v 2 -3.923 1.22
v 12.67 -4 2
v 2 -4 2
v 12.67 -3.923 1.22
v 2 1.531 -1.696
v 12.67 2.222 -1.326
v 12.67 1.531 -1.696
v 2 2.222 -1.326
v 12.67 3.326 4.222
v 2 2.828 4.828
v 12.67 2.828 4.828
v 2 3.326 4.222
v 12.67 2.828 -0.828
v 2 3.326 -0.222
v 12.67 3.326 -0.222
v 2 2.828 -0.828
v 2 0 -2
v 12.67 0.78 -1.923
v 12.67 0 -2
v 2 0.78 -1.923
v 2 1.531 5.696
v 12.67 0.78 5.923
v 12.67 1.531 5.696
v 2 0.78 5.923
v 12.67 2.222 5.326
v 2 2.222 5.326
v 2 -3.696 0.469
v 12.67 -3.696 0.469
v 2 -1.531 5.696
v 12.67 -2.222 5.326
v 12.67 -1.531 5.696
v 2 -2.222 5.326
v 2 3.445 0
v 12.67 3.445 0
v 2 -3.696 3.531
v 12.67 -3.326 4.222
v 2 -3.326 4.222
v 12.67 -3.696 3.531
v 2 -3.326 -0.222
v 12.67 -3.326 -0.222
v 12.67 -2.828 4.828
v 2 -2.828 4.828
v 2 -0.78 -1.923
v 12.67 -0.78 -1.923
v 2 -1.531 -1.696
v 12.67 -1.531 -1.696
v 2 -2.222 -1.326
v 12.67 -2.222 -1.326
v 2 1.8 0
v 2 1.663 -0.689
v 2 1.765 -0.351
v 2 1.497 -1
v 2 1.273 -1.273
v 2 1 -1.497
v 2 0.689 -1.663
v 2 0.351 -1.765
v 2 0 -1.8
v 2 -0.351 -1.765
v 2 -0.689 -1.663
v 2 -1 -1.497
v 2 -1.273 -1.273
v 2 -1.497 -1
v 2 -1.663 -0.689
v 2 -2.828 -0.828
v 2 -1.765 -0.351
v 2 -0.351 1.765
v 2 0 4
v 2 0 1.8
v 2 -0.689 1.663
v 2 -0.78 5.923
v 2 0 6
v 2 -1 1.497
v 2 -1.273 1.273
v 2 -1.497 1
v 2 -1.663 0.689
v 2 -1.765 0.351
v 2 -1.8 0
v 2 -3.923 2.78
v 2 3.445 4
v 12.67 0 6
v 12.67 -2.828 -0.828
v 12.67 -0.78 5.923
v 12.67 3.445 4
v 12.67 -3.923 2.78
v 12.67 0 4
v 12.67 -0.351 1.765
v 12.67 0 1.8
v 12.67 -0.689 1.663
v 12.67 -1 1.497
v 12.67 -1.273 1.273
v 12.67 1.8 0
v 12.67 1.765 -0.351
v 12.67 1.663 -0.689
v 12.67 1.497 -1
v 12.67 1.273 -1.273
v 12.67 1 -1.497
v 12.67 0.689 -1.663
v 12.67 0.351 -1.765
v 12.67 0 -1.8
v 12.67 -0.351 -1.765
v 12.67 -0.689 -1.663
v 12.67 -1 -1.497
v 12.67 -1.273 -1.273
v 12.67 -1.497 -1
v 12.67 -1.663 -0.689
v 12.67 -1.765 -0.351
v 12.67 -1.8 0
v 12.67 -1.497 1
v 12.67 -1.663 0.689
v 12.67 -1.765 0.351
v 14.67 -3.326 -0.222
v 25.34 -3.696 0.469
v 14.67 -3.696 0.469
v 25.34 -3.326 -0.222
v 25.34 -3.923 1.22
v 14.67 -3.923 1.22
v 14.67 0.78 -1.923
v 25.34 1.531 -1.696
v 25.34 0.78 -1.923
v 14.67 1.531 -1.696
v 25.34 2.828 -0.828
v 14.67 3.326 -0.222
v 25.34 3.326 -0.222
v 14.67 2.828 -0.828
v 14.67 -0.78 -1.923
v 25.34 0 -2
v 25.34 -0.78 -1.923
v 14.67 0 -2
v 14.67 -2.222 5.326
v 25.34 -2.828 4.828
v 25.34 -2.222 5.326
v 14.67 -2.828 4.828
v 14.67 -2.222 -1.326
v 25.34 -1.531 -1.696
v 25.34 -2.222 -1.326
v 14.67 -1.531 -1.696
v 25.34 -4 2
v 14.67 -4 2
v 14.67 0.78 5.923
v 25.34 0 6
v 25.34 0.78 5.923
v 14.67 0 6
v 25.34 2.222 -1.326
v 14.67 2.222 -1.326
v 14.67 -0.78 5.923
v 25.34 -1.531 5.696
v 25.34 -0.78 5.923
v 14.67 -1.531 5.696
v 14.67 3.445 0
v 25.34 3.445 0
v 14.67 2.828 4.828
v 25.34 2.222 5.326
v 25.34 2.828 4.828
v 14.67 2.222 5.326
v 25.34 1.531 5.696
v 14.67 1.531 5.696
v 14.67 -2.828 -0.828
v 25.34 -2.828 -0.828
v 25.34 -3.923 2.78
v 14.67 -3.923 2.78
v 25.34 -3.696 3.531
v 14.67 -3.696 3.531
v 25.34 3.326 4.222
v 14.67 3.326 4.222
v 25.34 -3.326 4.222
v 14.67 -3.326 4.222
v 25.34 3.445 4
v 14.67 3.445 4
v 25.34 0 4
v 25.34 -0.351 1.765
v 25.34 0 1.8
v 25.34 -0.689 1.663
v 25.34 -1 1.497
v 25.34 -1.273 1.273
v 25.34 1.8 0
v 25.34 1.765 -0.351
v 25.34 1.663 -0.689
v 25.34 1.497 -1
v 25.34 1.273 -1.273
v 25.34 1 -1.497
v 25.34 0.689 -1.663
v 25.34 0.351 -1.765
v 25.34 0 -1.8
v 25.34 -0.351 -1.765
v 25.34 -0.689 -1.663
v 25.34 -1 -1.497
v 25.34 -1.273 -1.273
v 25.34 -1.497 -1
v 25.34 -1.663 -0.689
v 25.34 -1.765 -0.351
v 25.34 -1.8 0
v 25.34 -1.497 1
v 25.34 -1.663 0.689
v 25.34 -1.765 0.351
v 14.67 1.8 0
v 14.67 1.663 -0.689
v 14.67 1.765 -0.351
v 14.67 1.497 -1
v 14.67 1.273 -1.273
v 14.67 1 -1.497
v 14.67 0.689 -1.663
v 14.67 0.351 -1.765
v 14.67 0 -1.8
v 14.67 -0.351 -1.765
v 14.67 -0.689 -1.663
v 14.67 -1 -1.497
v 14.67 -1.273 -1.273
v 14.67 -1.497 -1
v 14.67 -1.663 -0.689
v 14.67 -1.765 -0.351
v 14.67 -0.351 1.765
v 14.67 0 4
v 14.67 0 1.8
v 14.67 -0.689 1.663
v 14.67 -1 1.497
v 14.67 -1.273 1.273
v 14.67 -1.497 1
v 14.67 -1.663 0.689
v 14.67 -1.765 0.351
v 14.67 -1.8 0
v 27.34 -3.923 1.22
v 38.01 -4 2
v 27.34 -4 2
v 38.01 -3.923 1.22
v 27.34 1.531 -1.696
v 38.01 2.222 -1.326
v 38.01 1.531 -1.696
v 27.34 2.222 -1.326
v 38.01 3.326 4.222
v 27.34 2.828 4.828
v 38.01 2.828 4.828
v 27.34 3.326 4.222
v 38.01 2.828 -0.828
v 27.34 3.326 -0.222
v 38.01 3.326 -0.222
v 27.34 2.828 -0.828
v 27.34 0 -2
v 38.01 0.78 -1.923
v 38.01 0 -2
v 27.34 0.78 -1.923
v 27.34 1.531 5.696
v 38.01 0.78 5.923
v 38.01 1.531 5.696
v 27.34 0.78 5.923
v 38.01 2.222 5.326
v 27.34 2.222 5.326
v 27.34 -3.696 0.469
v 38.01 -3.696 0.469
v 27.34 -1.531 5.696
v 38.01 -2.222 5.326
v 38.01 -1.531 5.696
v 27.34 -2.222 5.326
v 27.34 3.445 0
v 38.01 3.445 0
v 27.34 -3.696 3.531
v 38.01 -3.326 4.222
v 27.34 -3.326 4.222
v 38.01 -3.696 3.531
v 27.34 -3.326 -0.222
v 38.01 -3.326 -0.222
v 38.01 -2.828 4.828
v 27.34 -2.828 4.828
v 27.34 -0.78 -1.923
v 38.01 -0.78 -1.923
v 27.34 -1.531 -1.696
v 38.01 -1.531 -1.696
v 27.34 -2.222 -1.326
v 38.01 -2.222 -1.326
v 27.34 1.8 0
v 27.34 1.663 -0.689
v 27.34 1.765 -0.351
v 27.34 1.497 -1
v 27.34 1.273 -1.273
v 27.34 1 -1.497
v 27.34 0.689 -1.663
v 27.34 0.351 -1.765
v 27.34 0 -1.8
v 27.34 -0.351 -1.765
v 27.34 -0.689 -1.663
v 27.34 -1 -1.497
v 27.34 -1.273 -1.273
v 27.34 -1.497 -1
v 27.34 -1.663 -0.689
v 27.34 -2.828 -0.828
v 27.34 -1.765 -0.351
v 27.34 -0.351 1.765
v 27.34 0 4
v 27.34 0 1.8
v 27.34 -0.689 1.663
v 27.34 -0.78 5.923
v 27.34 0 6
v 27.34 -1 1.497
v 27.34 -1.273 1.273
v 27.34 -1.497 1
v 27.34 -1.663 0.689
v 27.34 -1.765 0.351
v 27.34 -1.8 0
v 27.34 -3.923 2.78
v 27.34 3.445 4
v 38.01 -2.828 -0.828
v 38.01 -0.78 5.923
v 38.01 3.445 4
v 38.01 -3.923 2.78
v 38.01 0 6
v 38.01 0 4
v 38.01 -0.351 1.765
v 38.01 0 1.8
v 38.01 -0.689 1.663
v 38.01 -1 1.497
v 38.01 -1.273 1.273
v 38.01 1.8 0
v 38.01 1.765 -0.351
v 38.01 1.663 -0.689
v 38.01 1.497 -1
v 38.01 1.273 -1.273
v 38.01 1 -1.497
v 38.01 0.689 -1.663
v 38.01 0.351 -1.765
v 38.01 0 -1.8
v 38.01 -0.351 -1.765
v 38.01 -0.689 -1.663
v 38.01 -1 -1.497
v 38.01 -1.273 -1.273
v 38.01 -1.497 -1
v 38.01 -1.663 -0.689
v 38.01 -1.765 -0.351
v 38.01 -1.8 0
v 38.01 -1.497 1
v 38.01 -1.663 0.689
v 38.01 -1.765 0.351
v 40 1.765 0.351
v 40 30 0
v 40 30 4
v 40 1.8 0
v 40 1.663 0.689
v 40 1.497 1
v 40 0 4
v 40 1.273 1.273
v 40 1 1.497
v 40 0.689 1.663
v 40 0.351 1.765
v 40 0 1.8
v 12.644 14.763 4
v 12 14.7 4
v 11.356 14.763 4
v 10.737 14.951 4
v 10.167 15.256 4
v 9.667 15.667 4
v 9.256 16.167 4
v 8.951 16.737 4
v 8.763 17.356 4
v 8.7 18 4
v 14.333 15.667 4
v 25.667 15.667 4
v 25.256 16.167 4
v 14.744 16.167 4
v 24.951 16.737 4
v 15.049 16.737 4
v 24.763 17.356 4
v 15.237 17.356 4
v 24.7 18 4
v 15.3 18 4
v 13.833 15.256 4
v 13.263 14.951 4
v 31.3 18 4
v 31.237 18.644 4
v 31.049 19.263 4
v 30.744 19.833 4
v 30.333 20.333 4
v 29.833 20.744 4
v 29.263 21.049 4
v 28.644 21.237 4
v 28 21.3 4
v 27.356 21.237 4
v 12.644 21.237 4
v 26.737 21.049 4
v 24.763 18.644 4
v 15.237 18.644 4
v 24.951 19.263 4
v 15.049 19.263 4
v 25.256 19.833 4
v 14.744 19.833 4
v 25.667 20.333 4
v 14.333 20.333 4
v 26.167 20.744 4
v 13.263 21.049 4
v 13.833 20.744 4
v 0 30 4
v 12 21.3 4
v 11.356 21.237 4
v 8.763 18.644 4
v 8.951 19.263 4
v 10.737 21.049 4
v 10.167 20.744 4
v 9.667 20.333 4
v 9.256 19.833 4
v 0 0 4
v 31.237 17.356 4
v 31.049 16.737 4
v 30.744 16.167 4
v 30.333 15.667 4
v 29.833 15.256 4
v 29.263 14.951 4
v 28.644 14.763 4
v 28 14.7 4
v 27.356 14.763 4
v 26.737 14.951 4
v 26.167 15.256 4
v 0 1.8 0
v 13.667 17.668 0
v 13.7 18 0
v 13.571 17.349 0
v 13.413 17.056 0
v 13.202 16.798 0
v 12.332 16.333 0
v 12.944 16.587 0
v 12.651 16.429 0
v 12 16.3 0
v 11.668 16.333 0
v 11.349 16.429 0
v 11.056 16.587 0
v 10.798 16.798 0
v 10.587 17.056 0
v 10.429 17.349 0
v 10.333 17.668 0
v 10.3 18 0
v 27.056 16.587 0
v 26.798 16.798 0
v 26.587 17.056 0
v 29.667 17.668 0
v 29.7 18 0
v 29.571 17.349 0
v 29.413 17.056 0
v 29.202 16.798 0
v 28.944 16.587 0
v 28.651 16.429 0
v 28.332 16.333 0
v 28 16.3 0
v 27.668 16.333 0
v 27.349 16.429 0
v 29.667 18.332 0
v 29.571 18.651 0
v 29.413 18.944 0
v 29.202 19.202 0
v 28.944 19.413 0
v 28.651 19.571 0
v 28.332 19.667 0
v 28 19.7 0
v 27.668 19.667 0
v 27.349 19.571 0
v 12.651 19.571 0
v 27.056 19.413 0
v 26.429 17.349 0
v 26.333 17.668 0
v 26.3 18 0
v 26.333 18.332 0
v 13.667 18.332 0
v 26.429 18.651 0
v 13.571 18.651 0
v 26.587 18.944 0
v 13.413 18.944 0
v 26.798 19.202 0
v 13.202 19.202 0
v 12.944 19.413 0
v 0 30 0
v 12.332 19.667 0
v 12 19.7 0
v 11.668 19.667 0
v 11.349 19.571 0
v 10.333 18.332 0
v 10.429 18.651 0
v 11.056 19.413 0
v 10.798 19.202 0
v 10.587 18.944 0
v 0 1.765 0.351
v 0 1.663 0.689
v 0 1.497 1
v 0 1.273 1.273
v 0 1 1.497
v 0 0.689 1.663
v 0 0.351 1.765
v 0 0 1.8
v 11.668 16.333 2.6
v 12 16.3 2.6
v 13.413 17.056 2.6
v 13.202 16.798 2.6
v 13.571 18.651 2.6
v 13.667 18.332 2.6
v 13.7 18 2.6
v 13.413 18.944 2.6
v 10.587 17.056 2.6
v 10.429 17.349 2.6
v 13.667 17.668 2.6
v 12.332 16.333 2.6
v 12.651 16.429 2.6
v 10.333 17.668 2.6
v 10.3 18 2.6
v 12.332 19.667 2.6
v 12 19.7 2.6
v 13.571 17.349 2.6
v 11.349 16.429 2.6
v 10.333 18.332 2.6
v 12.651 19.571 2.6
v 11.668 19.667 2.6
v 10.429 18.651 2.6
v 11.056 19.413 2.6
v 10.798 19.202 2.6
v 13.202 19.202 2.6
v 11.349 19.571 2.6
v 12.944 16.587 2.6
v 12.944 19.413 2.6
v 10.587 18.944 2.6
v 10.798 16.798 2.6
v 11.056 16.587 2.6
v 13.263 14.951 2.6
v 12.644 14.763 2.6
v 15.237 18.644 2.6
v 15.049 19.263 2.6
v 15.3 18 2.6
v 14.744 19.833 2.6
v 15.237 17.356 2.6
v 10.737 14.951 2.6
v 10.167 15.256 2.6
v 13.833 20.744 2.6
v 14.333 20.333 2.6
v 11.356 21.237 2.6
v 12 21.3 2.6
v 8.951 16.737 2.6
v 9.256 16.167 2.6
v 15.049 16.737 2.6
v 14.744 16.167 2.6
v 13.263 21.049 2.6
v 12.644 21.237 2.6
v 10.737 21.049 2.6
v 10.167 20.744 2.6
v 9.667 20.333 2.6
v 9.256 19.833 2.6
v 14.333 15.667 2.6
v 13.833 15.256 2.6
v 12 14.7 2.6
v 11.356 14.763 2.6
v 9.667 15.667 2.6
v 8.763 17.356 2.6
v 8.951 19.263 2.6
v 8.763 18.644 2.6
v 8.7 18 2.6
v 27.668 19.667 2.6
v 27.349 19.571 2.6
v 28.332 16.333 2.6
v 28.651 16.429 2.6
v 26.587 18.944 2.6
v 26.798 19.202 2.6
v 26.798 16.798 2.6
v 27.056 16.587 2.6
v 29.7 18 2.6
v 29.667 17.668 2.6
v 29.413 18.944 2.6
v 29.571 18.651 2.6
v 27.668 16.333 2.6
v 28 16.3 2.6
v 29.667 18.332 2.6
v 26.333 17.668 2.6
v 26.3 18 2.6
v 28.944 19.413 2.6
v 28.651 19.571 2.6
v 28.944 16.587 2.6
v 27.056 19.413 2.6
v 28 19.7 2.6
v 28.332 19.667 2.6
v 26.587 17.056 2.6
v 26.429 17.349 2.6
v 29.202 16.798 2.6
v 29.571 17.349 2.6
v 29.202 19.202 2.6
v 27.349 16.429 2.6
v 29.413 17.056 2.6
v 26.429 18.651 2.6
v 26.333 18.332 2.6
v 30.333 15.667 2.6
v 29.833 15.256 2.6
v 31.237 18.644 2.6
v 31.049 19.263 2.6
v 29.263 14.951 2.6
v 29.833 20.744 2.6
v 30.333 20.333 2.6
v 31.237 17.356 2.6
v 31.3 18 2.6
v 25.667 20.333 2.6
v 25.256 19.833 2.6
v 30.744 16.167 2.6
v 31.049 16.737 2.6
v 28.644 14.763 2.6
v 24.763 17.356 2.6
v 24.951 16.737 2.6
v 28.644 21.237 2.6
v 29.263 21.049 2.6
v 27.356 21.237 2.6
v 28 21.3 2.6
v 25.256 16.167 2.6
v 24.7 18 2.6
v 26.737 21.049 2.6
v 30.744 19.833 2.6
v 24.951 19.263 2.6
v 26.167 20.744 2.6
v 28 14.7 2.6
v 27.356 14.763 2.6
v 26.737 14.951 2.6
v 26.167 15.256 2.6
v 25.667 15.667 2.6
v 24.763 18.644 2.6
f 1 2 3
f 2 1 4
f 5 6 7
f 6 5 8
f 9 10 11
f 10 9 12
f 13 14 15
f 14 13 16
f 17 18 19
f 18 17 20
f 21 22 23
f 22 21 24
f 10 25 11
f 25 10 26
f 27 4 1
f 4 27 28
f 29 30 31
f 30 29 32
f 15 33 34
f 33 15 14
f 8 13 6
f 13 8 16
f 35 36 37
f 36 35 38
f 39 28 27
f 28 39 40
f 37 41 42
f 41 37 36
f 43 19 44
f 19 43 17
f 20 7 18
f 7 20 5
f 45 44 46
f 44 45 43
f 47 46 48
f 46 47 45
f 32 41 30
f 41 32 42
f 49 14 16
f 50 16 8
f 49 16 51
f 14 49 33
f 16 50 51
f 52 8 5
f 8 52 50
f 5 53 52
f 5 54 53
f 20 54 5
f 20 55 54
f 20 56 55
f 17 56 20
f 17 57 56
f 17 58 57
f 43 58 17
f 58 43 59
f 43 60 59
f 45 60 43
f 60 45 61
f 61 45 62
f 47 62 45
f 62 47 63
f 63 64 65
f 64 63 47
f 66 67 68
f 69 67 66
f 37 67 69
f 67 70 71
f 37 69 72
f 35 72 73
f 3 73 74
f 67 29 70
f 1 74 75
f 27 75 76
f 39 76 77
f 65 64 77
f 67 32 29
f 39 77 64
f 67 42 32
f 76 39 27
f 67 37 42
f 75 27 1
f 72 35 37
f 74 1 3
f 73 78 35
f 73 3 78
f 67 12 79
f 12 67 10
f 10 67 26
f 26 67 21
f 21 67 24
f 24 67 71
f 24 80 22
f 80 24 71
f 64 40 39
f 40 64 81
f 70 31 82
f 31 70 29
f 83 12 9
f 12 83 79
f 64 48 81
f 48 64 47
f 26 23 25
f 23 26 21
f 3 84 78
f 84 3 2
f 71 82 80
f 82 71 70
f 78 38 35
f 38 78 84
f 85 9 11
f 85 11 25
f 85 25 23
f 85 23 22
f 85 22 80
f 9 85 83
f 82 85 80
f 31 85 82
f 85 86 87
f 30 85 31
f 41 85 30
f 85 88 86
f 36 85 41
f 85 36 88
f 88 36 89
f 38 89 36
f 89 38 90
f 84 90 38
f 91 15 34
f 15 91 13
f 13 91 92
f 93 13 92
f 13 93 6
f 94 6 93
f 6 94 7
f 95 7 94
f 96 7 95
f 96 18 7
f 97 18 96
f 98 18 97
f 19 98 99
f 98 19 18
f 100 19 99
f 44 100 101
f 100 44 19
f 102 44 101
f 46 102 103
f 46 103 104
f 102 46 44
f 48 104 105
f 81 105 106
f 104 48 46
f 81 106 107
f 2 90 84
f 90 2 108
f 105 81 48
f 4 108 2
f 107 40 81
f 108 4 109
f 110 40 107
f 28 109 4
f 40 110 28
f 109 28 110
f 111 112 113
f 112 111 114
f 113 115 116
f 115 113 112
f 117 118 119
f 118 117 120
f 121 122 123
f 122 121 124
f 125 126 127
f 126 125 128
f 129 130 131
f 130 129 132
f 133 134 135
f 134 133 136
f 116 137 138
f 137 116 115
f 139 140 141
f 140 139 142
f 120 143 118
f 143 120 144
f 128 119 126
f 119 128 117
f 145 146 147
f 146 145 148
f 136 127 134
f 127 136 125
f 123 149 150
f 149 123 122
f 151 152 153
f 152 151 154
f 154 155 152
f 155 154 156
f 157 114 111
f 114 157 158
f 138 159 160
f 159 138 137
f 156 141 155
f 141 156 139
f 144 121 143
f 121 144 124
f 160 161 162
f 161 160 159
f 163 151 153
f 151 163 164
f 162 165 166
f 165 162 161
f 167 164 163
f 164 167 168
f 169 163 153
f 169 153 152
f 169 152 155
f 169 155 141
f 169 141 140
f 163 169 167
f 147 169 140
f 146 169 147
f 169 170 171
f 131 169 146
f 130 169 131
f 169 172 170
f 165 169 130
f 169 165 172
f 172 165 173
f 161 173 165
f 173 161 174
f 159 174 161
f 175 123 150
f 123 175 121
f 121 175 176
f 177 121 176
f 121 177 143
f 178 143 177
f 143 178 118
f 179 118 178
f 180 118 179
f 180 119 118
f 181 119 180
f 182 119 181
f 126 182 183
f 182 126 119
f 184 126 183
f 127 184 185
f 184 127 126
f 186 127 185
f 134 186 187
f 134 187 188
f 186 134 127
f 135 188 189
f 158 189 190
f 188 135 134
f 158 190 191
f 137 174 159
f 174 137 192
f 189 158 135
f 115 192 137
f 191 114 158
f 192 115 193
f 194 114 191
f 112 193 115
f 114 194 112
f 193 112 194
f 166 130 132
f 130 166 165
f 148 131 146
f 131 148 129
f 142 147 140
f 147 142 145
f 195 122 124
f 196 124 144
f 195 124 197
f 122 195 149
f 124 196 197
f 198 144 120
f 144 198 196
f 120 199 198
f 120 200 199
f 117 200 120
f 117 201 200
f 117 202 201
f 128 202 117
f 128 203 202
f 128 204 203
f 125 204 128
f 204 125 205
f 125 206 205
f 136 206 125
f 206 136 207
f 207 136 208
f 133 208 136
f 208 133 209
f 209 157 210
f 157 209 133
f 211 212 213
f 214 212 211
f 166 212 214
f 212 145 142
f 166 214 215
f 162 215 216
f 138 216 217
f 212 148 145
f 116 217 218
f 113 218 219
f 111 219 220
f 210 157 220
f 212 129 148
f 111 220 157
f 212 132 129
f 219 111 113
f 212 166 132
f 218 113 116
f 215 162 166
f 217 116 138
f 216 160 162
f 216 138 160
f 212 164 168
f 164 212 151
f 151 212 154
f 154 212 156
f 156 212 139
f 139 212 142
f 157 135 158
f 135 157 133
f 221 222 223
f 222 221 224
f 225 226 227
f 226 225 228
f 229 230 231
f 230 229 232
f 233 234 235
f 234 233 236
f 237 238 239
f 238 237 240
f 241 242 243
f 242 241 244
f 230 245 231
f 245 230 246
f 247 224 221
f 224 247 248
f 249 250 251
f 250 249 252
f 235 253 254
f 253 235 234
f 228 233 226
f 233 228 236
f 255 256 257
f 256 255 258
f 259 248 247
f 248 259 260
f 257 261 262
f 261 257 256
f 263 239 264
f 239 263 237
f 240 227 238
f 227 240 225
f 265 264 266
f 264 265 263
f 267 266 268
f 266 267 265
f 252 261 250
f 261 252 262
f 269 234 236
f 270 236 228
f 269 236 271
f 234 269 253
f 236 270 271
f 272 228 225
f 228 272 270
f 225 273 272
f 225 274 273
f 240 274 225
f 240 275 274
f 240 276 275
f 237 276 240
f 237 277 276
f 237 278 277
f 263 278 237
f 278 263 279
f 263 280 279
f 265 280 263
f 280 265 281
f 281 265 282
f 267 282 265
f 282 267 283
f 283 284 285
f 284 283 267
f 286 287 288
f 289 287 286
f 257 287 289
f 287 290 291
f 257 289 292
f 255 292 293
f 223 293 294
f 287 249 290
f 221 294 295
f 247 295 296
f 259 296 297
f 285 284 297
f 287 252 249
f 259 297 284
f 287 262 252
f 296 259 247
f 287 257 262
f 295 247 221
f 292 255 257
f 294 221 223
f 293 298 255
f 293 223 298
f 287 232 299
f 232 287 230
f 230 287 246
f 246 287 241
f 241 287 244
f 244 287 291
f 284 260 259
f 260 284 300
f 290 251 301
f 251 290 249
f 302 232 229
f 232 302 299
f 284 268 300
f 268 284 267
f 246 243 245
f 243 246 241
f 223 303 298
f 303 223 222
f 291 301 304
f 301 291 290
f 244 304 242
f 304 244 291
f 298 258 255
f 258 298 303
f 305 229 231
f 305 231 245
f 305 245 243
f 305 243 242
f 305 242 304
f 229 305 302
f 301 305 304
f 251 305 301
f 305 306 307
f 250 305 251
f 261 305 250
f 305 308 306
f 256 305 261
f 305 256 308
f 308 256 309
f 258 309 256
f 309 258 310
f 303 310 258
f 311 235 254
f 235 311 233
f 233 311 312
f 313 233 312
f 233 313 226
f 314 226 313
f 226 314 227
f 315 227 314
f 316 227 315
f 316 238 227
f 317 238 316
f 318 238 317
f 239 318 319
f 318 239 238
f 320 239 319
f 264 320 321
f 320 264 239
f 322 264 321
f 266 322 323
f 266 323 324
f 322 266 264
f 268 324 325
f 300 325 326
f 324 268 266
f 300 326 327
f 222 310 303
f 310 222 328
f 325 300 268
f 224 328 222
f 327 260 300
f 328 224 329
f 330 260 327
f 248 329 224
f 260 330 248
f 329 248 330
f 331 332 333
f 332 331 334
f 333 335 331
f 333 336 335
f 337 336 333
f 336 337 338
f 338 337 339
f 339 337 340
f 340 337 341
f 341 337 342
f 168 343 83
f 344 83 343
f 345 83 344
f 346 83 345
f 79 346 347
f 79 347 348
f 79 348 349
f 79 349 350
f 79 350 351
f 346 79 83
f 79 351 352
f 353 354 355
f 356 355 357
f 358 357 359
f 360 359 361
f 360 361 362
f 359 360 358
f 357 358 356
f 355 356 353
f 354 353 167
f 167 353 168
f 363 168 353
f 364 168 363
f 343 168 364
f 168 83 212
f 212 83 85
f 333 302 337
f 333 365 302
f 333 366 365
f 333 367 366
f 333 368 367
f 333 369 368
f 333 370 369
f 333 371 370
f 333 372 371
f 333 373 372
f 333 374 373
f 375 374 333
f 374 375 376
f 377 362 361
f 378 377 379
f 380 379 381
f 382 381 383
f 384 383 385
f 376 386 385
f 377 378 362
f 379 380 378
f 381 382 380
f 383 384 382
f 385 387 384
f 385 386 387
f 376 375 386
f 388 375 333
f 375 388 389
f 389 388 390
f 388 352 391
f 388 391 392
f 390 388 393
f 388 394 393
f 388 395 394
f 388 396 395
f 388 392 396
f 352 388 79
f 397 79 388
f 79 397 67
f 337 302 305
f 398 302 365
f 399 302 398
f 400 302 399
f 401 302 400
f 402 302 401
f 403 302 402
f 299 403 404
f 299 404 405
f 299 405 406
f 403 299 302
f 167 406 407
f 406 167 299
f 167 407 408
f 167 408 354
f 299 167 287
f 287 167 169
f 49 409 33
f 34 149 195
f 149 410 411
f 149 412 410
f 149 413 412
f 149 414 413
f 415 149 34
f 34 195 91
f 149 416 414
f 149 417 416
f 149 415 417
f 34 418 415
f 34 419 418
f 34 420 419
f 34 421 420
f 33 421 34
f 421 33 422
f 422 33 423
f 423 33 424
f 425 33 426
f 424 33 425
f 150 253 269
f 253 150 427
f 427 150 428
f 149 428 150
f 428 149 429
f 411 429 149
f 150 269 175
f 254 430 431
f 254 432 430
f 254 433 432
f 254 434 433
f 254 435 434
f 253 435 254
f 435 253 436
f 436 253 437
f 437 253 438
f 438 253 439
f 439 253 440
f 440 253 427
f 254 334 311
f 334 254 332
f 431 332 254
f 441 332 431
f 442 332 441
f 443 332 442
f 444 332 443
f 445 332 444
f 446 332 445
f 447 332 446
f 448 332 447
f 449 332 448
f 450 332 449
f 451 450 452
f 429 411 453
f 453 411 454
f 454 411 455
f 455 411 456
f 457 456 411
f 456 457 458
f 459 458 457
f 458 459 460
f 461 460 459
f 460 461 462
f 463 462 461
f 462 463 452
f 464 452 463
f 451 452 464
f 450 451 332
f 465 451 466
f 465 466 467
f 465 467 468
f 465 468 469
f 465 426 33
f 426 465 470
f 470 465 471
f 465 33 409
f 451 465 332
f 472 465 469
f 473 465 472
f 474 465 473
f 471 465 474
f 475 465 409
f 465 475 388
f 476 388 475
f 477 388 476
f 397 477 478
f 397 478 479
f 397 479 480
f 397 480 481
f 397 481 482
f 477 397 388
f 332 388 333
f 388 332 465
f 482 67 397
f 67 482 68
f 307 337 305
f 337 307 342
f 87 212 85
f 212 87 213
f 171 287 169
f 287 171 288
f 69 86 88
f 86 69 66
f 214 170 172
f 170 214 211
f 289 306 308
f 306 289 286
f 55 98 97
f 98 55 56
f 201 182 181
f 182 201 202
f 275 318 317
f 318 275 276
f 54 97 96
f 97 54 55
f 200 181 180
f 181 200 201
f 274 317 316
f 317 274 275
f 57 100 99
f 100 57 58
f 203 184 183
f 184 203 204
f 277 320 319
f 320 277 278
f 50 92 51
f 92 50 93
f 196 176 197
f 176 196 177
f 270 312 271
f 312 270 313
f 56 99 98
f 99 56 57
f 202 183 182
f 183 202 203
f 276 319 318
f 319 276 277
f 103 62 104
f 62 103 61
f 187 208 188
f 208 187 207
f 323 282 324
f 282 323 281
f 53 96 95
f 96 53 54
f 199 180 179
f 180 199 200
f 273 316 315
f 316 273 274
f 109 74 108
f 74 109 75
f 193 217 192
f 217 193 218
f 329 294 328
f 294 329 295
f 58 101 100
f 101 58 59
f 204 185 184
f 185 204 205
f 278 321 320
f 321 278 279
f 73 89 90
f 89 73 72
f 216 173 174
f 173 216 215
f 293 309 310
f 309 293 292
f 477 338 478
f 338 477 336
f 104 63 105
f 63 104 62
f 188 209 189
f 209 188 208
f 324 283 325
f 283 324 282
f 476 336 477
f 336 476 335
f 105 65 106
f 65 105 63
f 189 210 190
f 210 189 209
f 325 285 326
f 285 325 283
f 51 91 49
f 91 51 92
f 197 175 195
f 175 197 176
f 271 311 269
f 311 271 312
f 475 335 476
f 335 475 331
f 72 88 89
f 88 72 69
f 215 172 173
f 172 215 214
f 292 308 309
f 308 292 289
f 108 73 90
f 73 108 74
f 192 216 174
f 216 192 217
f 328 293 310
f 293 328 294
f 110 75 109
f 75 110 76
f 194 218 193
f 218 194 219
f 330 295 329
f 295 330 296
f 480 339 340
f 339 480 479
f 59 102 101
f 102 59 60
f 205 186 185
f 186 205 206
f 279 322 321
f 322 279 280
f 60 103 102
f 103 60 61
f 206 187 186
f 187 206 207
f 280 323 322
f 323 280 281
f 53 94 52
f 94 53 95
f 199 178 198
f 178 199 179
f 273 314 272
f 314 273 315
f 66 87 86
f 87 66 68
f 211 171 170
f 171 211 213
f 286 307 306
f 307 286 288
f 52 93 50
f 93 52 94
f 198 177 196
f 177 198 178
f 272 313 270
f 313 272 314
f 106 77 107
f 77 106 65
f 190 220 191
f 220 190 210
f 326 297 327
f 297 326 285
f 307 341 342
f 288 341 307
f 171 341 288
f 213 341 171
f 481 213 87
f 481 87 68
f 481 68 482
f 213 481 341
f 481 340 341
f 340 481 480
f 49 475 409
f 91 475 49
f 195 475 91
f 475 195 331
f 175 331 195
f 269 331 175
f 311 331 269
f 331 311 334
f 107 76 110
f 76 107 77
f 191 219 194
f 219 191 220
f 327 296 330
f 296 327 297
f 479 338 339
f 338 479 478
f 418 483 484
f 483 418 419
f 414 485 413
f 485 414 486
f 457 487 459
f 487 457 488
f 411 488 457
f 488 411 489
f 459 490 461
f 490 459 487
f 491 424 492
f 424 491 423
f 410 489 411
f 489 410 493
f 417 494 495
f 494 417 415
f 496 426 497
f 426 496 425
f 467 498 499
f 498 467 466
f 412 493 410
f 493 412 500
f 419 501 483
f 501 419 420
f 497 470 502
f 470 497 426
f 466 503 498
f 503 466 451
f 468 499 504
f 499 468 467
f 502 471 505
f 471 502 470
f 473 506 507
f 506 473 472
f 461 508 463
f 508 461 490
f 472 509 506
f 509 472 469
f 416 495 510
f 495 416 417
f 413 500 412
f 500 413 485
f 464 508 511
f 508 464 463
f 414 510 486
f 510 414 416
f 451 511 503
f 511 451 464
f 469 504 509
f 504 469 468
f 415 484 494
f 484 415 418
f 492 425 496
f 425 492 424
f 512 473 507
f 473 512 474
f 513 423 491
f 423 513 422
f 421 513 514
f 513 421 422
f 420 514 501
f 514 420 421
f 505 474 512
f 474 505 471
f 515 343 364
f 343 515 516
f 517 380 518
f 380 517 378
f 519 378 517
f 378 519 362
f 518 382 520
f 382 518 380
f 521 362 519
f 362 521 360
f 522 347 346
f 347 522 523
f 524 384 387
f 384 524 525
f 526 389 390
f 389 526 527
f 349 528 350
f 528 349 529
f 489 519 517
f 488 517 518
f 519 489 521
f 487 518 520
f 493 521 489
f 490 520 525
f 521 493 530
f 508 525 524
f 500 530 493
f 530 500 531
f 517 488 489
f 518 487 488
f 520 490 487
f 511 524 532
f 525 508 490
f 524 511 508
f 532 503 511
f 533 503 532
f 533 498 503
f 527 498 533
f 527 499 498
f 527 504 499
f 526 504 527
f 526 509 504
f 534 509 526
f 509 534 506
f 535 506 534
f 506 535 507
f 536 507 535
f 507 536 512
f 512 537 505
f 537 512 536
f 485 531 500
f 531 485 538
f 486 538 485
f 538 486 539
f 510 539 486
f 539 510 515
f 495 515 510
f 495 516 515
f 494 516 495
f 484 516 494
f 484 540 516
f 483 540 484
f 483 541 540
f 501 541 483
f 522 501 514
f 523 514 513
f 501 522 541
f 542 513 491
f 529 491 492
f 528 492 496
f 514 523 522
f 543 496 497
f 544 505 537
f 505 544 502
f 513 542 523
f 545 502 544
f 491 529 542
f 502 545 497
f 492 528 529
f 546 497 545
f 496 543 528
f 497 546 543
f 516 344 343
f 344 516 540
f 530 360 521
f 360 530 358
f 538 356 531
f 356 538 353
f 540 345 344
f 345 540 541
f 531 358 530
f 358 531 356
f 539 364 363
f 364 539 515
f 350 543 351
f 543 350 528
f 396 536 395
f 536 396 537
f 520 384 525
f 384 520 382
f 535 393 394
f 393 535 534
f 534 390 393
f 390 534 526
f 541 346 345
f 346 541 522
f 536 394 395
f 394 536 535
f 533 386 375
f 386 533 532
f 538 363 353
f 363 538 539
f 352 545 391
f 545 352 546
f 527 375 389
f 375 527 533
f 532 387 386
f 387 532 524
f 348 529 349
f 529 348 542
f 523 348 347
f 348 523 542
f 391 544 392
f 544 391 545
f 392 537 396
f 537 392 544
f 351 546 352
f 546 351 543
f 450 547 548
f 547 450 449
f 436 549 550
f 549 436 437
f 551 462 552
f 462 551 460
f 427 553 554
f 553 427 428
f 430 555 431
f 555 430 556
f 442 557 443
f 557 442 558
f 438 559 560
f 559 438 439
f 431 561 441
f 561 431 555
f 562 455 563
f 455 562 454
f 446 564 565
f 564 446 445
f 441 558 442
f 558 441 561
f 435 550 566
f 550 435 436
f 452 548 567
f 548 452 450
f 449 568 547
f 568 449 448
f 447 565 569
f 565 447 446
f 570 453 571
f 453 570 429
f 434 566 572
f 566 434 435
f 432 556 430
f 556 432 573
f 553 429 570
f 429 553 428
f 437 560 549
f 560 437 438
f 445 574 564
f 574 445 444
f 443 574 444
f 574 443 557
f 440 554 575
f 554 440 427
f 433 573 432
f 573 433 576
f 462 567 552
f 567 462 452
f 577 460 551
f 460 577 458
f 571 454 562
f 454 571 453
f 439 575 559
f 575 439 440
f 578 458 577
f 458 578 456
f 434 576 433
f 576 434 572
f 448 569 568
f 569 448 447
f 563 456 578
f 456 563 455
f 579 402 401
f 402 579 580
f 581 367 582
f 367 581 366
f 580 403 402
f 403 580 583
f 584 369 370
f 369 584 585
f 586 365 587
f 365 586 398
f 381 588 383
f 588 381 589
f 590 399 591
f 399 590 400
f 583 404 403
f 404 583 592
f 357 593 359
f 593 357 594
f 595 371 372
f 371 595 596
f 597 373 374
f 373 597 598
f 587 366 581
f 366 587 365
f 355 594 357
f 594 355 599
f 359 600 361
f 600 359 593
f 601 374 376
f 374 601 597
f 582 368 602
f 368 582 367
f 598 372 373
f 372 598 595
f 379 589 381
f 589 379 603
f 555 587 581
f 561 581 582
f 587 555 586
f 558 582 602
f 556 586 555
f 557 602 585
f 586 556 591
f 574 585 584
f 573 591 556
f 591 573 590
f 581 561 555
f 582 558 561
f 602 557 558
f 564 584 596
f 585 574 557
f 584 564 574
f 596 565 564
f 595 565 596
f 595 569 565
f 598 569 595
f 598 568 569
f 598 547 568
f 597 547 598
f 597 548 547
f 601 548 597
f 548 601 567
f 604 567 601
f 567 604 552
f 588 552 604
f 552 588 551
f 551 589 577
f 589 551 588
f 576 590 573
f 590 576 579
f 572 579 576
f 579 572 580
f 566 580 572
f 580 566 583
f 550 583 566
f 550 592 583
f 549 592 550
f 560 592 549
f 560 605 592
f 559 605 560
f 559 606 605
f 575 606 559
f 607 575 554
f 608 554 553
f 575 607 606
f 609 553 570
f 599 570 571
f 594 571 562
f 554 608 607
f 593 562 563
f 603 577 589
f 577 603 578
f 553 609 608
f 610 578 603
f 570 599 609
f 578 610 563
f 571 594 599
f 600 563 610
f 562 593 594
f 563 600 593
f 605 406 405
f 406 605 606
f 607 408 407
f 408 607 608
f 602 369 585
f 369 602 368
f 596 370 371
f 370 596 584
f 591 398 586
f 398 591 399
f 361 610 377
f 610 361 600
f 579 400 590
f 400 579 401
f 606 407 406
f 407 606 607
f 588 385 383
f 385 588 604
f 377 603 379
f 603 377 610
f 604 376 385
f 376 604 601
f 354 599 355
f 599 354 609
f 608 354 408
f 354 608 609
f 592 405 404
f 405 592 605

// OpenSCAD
$fn = 32;

// ----------------------------------------------------------------------
// Hinge leaf: 40 x 34 x 8 mm
// ----------------------------------------------------------------------

// --- parameters (mm) ---
leaf_len = 40;            // leaf length, X
leaf_w = 30;              // leaf width, Y
leaf_t = 4;               // leaf thickness
knuckle_d = 8;            // knuckle diameter
knuckle_w = 10.67;        // knuckle width
knuckle_n = 3;            // number of knuckles
pin_d = 3.6;              // pin bore
gap = 2;                  // gap between the knuckles
screw_d = 3.4;            // screw clearance
cs_d = 6.6;               // countersink diameter
cs_h = 1.4;               // countersink depth

module leaf() {
  cube([leaf_len, leaf_w, leaf_t]);
}

module knuckles() {
  /* barrels sit on the leaf edge, the pin axis at half the leaf thickness */
  for (i = [0 : knuckle_n - 1])
    translate([gap + i * (knuckle_w + gap), 0, leaf_t * 0.5])
      rotate([0, 90, 0]) cylinder(h = knuckle_w, d = knuckle_d);
}

difference() {
  union() {
    leaf();
    knuckles();
  }
  rotate([0, 90, 0]) translate([0, 0, -1])
    cylinder(h = leaf_len + 2, d = pin_d);
  translate([12, leaf_w * 0.6, -1]) cylinder(h = leaf_t + 2, d = screw_d);
  translate([12, leaf_w * 0.6, leaf_t - cs_h]) cylinder(h = cs_h + 0.5, d = cs_d);
  translate([28, leaf_w * 0.6, -1]) cylinder(h = leaf_t + 2, d = screw_d);
  translate([28, leaf_w * 0.6, leaf_t - cs_h]) cylinder(h = cs_h + 0.5, d = cs_d);
}
